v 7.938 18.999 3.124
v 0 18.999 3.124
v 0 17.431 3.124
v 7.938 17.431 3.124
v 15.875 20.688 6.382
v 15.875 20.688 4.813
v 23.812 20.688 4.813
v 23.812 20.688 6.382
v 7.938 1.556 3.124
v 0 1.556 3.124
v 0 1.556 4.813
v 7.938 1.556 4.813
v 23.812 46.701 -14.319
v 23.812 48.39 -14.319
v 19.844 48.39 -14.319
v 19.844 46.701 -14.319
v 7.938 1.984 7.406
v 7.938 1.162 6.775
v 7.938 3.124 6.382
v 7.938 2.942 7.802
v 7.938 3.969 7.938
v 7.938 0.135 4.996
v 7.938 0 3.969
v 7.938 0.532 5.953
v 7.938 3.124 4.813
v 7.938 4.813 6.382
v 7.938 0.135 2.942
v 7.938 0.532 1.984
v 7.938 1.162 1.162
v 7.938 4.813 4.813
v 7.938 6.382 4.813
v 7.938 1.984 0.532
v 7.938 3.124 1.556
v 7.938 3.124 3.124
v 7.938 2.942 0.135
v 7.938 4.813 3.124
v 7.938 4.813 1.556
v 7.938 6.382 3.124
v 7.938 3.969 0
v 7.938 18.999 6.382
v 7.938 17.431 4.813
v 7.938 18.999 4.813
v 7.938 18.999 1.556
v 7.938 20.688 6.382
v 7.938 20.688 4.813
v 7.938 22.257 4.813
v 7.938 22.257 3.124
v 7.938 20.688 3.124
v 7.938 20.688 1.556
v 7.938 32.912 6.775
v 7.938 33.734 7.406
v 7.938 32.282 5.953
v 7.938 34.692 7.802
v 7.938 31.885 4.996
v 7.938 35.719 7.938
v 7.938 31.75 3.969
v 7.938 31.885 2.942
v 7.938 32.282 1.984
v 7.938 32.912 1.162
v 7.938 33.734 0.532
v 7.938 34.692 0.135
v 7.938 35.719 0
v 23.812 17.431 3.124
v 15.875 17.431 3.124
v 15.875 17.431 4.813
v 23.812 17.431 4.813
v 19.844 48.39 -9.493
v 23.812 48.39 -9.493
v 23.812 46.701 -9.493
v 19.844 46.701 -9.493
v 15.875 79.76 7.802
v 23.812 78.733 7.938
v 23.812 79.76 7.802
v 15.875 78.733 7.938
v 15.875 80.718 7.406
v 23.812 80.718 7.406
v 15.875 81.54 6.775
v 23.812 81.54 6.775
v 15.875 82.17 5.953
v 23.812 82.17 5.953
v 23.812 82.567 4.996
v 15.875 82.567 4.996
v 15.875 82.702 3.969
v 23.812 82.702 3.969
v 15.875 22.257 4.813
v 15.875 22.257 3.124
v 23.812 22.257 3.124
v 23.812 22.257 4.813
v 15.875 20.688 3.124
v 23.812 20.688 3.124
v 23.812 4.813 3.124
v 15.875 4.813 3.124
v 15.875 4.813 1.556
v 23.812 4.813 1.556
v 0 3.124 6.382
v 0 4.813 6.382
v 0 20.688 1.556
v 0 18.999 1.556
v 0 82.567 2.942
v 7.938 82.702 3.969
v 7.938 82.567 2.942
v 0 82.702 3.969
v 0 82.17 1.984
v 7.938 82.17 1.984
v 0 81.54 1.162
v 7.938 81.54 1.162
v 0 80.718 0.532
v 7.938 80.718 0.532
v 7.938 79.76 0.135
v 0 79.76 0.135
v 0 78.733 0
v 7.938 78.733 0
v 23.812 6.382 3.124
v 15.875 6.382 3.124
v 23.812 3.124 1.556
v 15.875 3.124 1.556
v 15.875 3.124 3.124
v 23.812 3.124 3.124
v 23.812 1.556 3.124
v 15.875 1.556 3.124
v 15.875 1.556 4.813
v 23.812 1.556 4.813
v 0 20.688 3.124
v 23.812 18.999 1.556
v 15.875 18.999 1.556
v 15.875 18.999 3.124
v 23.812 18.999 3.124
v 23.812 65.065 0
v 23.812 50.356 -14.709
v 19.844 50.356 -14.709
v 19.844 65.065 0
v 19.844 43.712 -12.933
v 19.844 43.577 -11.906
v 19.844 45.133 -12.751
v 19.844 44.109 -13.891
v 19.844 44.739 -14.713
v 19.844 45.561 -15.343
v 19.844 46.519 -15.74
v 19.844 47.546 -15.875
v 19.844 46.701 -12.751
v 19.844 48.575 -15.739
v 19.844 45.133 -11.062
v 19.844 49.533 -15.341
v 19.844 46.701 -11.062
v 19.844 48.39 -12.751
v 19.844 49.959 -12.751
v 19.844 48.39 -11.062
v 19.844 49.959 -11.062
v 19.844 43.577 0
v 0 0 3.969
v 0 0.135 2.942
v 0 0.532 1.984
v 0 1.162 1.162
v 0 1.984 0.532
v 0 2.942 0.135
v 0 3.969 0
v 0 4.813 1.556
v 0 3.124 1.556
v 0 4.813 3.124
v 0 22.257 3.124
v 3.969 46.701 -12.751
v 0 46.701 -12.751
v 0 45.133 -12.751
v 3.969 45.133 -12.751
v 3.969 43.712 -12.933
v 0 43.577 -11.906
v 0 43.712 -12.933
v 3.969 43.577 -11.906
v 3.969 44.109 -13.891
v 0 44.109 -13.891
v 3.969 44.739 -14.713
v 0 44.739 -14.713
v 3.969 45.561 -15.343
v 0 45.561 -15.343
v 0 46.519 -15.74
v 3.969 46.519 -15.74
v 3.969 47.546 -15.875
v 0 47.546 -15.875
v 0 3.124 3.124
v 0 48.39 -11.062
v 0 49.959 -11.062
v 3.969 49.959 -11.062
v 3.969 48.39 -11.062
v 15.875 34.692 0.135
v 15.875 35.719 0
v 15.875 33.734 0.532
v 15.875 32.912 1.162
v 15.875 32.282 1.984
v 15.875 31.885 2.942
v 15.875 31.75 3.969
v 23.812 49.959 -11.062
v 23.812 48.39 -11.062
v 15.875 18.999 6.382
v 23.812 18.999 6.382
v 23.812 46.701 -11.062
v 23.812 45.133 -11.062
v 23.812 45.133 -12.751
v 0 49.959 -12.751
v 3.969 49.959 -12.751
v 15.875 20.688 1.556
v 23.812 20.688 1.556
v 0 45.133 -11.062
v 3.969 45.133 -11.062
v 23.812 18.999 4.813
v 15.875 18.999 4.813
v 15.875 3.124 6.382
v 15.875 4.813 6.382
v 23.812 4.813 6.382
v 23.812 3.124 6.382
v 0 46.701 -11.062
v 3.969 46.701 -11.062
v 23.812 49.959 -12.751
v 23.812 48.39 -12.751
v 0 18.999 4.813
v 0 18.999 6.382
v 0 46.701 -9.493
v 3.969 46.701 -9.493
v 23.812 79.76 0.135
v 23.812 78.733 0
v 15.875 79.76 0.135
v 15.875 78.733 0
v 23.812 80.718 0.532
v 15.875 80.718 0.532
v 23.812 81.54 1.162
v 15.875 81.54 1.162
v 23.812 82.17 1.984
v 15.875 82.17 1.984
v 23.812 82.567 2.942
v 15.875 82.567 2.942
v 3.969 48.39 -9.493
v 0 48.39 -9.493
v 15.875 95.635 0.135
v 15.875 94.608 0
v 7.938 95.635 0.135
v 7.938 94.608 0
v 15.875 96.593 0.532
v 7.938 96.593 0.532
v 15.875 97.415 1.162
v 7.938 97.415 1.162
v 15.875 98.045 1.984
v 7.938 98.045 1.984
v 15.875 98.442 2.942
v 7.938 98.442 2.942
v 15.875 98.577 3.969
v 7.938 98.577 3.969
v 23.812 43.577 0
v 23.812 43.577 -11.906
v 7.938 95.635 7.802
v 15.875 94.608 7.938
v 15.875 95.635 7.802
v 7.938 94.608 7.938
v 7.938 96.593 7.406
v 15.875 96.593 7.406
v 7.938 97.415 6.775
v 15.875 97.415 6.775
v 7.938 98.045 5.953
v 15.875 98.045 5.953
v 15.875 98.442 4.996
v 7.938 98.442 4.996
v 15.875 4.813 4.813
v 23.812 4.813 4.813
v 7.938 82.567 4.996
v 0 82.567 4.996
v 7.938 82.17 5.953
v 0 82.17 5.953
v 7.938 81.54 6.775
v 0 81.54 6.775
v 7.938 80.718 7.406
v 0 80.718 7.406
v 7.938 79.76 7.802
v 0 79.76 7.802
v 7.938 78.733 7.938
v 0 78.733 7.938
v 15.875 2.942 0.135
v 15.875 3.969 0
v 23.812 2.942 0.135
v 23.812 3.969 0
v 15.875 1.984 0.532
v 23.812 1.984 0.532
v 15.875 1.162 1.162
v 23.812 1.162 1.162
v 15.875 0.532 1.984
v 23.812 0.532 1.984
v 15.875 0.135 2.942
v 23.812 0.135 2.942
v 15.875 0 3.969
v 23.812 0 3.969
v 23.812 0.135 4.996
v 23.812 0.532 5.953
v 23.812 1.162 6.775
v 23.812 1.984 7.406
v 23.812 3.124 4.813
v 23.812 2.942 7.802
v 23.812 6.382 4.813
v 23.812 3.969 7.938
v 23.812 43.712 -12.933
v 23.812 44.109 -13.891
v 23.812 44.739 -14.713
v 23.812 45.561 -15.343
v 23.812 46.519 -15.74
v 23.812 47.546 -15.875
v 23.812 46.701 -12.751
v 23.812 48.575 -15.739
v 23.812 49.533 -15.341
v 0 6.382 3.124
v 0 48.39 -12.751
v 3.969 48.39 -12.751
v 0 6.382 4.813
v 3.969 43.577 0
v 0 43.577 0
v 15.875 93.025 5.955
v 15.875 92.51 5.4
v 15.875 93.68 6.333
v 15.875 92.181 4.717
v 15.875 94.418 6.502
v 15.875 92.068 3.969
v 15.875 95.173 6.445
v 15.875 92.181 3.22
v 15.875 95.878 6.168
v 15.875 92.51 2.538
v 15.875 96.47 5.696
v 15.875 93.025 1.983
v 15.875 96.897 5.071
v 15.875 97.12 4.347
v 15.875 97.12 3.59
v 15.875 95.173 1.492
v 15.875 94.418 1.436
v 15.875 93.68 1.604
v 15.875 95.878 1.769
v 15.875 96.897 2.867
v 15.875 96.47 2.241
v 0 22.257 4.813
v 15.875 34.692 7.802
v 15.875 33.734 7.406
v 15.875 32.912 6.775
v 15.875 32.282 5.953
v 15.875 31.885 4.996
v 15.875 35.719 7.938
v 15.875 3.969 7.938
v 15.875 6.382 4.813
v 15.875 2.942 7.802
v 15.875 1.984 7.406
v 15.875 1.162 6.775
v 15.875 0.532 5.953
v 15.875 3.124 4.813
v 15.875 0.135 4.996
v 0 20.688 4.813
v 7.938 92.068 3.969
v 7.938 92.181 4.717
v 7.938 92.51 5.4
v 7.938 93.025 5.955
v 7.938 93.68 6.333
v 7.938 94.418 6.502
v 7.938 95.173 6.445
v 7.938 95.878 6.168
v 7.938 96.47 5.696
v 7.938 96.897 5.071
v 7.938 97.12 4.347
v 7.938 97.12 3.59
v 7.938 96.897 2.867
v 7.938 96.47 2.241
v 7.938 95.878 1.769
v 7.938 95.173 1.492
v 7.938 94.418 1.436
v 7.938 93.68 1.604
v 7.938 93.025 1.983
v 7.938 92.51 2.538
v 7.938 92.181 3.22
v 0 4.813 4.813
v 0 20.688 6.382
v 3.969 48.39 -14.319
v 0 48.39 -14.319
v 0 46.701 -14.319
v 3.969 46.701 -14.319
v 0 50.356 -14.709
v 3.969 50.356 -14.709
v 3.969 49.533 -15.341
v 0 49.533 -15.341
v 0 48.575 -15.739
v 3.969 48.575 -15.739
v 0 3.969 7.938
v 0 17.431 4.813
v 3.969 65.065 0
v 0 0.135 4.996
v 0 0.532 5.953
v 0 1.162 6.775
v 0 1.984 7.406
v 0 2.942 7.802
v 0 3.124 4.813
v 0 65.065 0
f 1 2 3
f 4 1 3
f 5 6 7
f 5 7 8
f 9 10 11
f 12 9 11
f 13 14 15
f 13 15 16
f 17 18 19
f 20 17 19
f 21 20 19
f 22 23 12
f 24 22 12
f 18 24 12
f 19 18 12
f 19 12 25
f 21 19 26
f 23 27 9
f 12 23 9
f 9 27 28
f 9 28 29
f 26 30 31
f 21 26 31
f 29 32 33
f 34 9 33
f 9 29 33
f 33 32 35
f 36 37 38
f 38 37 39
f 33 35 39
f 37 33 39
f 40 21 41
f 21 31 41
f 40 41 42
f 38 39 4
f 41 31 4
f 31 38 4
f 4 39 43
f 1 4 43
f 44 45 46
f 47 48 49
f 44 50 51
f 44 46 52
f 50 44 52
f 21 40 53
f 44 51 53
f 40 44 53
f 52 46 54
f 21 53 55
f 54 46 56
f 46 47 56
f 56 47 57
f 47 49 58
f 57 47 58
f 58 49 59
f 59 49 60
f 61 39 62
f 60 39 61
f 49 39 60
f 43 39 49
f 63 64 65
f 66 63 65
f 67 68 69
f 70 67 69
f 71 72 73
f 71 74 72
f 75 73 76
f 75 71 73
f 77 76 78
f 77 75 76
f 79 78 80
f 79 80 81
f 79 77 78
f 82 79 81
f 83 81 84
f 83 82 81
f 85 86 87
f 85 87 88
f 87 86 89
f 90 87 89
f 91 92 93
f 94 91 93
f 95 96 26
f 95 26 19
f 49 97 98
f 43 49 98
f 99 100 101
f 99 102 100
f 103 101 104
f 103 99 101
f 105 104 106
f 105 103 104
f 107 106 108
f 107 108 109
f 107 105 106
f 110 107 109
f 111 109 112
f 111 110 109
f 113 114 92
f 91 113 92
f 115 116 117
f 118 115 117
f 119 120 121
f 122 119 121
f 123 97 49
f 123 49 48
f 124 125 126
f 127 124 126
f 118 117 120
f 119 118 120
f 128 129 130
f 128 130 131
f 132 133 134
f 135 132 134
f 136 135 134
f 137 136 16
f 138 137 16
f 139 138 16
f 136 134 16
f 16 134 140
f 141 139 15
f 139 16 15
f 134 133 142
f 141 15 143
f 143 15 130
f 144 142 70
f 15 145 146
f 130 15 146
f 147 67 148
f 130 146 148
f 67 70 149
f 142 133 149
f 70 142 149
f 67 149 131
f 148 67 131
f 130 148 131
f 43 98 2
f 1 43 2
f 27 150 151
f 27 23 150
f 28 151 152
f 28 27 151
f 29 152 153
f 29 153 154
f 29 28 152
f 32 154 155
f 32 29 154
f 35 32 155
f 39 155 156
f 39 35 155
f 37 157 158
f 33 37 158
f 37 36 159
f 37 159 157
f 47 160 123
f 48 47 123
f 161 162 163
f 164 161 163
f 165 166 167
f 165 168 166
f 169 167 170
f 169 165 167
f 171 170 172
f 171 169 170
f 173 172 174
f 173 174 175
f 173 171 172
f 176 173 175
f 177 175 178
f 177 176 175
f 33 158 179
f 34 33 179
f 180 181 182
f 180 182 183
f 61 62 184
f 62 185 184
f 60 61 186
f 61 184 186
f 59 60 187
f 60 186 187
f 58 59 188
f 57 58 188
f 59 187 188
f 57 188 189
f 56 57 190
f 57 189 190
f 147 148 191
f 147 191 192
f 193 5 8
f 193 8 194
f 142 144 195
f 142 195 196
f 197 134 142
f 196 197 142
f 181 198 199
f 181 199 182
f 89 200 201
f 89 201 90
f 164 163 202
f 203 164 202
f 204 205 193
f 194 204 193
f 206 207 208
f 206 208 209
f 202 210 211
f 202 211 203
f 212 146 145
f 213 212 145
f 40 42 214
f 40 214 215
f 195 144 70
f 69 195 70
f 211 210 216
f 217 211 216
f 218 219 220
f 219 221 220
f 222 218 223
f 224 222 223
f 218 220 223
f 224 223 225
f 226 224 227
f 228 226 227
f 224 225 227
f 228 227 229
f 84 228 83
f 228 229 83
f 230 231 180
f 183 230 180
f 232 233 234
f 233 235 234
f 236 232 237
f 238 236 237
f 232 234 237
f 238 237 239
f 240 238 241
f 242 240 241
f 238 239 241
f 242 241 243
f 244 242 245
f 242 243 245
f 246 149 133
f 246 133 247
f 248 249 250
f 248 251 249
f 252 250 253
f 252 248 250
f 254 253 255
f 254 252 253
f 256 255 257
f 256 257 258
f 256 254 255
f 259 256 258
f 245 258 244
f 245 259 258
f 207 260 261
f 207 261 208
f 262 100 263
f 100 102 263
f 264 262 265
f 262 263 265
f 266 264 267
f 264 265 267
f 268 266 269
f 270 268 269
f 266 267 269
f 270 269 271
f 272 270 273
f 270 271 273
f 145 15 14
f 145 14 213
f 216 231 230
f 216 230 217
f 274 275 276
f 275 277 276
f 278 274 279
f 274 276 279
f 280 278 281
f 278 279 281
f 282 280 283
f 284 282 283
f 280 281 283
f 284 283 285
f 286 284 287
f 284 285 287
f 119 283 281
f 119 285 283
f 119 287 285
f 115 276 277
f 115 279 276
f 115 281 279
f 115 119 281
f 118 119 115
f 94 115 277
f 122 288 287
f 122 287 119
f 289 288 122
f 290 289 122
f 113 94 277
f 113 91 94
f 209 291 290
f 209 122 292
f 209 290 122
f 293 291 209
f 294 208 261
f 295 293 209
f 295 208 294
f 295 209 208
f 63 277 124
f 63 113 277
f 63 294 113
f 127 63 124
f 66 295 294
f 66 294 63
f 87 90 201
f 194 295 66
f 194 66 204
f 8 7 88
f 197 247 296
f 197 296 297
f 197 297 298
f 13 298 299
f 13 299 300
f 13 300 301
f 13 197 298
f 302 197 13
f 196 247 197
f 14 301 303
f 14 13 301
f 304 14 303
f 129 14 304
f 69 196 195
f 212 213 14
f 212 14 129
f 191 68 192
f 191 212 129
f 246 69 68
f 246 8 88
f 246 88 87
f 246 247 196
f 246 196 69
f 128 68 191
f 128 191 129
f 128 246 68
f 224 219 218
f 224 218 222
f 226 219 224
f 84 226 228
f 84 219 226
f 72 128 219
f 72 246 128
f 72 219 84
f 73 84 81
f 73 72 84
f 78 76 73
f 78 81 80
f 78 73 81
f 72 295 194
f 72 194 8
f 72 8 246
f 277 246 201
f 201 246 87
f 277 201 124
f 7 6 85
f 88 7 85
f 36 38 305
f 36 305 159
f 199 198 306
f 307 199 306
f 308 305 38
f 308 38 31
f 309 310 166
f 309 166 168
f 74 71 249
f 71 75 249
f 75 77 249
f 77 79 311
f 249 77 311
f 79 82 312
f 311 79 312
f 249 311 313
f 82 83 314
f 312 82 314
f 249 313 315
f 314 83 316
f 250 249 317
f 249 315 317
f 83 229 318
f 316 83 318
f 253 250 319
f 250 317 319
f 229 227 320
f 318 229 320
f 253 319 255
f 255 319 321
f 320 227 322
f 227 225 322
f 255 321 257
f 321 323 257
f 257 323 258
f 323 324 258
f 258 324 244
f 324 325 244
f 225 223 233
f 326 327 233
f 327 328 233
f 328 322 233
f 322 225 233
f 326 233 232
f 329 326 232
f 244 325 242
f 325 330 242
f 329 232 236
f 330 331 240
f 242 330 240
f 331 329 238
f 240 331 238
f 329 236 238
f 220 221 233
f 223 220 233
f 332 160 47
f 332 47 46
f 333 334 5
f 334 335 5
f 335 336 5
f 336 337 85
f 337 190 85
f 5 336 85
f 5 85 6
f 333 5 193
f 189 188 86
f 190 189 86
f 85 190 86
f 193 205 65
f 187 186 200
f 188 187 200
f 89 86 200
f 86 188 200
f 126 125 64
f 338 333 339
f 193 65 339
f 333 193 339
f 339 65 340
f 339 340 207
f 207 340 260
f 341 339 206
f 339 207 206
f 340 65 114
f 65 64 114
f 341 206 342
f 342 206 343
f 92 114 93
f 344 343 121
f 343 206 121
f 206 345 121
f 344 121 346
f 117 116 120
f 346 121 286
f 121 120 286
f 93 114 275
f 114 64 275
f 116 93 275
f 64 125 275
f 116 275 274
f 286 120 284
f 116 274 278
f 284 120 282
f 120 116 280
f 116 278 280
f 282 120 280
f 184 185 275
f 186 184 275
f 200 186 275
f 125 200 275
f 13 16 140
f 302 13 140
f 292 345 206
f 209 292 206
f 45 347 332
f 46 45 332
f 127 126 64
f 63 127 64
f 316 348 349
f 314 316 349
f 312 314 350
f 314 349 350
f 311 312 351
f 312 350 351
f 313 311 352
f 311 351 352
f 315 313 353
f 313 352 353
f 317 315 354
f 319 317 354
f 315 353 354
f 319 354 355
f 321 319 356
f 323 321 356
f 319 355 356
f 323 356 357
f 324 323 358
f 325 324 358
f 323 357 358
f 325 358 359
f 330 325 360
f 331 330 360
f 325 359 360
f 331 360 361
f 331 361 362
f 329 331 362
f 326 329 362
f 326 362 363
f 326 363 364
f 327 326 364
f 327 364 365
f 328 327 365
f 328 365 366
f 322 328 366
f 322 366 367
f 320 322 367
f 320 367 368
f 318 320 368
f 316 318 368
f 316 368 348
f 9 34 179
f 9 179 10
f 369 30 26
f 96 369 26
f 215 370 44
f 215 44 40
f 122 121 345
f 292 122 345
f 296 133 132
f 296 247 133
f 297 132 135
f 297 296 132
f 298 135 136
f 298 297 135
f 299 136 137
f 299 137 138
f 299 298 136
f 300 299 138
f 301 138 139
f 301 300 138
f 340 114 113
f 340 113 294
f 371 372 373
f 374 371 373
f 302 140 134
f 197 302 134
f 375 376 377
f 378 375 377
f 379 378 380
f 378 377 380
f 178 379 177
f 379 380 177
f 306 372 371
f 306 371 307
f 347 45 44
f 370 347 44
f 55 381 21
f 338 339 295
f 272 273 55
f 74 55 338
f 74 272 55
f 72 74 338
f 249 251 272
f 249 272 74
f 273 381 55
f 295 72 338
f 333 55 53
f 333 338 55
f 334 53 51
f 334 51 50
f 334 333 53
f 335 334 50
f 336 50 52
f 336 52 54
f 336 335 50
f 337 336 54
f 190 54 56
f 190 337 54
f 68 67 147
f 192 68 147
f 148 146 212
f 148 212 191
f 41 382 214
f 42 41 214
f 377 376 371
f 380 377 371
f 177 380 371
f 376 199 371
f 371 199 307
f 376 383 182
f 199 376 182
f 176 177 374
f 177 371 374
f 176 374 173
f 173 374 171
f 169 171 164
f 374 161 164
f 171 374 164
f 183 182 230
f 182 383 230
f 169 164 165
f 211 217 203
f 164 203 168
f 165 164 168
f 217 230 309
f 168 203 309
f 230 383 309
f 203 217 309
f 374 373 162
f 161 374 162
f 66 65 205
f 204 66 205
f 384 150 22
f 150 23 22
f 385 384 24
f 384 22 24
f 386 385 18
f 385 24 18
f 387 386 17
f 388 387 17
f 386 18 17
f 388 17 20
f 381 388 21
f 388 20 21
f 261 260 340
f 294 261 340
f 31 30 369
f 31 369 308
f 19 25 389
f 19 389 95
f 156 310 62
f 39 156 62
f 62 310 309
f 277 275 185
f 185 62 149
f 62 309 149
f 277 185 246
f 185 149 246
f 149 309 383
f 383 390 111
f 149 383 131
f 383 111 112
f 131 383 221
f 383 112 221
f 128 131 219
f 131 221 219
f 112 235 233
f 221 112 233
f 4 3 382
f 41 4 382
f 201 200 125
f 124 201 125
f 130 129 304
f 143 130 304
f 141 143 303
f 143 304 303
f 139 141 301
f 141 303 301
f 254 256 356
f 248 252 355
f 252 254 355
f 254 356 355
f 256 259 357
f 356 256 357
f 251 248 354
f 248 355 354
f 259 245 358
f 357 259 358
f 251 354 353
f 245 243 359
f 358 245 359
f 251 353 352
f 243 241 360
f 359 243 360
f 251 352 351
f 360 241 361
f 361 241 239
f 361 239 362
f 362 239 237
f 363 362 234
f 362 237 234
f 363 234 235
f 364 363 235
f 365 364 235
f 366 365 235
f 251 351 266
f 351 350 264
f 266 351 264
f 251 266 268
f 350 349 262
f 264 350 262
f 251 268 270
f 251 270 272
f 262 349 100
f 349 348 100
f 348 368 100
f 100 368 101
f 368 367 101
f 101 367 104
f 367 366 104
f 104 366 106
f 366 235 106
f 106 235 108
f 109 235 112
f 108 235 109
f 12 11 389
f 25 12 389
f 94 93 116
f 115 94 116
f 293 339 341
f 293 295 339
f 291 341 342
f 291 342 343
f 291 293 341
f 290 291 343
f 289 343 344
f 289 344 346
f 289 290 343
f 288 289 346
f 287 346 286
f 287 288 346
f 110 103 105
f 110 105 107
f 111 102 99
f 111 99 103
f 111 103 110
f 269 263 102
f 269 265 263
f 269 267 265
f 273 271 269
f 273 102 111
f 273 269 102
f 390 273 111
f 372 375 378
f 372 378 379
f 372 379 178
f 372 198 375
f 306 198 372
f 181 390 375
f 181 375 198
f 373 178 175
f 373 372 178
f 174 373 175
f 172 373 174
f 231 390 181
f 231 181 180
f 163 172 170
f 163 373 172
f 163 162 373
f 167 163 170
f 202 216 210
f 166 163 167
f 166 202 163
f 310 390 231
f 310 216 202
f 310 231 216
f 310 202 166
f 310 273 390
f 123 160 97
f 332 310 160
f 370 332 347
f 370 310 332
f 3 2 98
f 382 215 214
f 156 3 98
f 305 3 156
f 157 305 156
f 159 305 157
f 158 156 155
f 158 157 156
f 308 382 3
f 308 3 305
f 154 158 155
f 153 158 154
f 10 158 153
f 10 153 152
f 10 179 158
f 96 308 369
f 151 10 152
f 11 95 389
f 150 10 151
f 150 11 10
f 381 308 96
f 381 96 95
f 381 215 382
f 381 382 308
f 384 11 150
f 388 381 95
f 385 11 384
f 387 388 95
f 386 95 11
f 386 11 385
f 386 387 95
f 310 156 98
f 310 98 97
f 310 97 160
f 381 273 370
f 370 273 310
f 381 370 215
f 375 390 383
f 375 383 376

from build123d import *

# Parameters (mm, degrees)
F1_DEPTH  = 7.9375
F2_W      = 3.96875
F2_H      = 7.9375
F3_DEPTH  = 15.875
F4_R      = 3.96874
F5_W      = 1.56845
F5_H      = 1.6891
F5_W_2    = 1.6891
F5_H_2    = 1.56845
F5_R      = 2.54
F6_DEPTH  = 23.8125
F8_DEPTH  = 3.96875
F10_DEPTH = 3.96875


# Not quite as in the source:
# - a fillet or chamfer is up to 0.001 mm smaller than in the source, because OpenCascade refuses the exact size


with BuildPart() as f1:
    # F0 (on Top) → F1 (new body)
    with BuildSketch(Plane.XY):
        Polygon((0, 82.7019174), (0, 0), (7.9375, 0), (7.9375, 31.75), (15.875, 31.75), (15.875, 0), (23.8125, 0), (23.8125, 82.7019174), (15.875, 82.7019174), (15.875, 98.5769174), (7.9375, 98.5769174), (7.9375, 82.7019174), align=None)
    extrude(amount=F1_DEPTH)

    # F2 (on face) → F3 (join)
    with BuildSketch(Plane(origin=(0, 0, 0), x_dir=(1, 0, 0), z_dir=(0, 0, -1))):
        with Locations((21.828125, -47.5457774)):
            Rectangle(F2_W, F2_H)
        with Locations((1.984375, -47.5457774)):
            Rectangle(F2_W, F2_H)
    extrude(amount=F3_DEPTH)

    # F4 (radius 3.96875 in the source; OpenCascade refuses exactly that, so slightly less here)
    f4_edges = [f1.edges().sort_by_distance(p)[0] for p in [
        (19.84375, 82.701917, 0),
        (19.84375, 82.701917, 7.9375),
        (11.90625, 98.576917, 0),
        (11.90625, 98.576917, 7.9375),
        (3.96875, 82.701917, 0),
        (3.96875, 82.701917, 7.9375),
        (1.984375, 51.514527, -15.875),
        (1.984375, 43.577027, -15.875),
        (21.828125, 51.514527, -15.875),
        (21.828125, 43.577027, -15.875),
        (3.96875, 0, 0),
        (3.96875, 0, 7.9375),
        (19.84375, 0, 7.9375),
        (19.84375, 0, 0),
        (11.90625, 31.75, 7.9375),
        (11.90625, 31.75, 0),
    ]]
    fillet(f4_edges, radius=F4_R)

    # F5 (on face) → F6 (cut, through all)
    with BuildSketch(Plane(origin=(0, 0, 0), x_dir=(0, -1, 0), z_dir=(-1, 0, 0))):
        with Locations((-2.339975, 3.96875)):
            Rectangle(F5_W, F5_H)
        with Locations((-3.96875, 2.339975)):
            Rectangle(F5_W_2, F5_H_2)
        with Locations((-3.96875, 3.96875)):
            Rectangle(F5_W_2, F5_H)
        with Locations((-5.597525, 3.96875)):
            Rectangle(F5_W, F5_H)
        with Locations((-3.96875, 5.597525)):
            Rectangle(F5_W_2, F5_H_2)
        with Locations((-47.5457774, -10.277475)):
            Rectangle(F5_W_2, F5_H_2)
        with Locations((-47.5457774, -11.90625)):
            Rectangle(F5_W_2, F5_H)
        with Locations((-49.1745524, -11.90625)):
            Rectangle(F5_W, F5_H)
        with Locations((-45.9170024, -11.90625)):
            Rectangle(F5_W, F5_H)
        with Locations((-47.5457774, -13.535025)):
            Rectangle(F5_W_2, F5_H_2)
        with Locations((-19.84375, 2.339975)):
            Rectangle(F5_W_2, F5_H_2)
        with Locations((-21.472525, 3.96875)):
            Rectangle(F5_W, F5_H)
        with Locations((-19.84375, 3.96875)):
            Rectangle(F5_W_2, F5_H)
        with Locations((-18.214975, 3.96875)):
            Rectangle(F5_W, F5_H)
        with Locations((-19.84375, 5.597525)):
            Rectangle(F5_W_2, F5_H_2)
        with Locations((-94.6081674, 3.96875)):
            Circle(F5_R)
    extrude(amount=-F6_DEPTH, mode=Mode.SUBTRACT)

    # F7 (on face) → F8 (join, through all)
    with BuildSketch(Plane(origin=(0, 0, 0), x_dir=(0, -1, 0), z_dir=(-1, 0, 0))):
        with BuildLine():
            Line((-65.0646874757, 0), (-50.3521074378, -14.7125800378))
            ThreePointArc((-50.3521074378, -14.7125800378), (-51.2124242947, -13.4250248722), (-51.5145274, -11.90625))
            Line((-51.5145274, -11.90625), (-51.5145274, 0))
            Line((-51.5145274, 0), (-65.0646874757, 0))
        make_face()
    extrude(amount=-F8_DEPTH)

    # F9 (on face) → F10 (join, through all)
    with BuildSketch(Plane.YZ.offset(23.8125)):
        with BuildLine():
            ThreePointArc((51.5145274, -11.90625), (51.2124242947, -13.4250248722), (50.3521074378, -14.7125800378))
            Line((50.3521074378, -14.7125800378), (65.0646874757, 0))
            Line((65.0646874757, 0), (51.5145274, 0))
            Line((51.5145274, 0), (51.5145274, -11.90625))
        make_face()
    extrude(amount=-F10_DEPTH)


solid = f1.part
